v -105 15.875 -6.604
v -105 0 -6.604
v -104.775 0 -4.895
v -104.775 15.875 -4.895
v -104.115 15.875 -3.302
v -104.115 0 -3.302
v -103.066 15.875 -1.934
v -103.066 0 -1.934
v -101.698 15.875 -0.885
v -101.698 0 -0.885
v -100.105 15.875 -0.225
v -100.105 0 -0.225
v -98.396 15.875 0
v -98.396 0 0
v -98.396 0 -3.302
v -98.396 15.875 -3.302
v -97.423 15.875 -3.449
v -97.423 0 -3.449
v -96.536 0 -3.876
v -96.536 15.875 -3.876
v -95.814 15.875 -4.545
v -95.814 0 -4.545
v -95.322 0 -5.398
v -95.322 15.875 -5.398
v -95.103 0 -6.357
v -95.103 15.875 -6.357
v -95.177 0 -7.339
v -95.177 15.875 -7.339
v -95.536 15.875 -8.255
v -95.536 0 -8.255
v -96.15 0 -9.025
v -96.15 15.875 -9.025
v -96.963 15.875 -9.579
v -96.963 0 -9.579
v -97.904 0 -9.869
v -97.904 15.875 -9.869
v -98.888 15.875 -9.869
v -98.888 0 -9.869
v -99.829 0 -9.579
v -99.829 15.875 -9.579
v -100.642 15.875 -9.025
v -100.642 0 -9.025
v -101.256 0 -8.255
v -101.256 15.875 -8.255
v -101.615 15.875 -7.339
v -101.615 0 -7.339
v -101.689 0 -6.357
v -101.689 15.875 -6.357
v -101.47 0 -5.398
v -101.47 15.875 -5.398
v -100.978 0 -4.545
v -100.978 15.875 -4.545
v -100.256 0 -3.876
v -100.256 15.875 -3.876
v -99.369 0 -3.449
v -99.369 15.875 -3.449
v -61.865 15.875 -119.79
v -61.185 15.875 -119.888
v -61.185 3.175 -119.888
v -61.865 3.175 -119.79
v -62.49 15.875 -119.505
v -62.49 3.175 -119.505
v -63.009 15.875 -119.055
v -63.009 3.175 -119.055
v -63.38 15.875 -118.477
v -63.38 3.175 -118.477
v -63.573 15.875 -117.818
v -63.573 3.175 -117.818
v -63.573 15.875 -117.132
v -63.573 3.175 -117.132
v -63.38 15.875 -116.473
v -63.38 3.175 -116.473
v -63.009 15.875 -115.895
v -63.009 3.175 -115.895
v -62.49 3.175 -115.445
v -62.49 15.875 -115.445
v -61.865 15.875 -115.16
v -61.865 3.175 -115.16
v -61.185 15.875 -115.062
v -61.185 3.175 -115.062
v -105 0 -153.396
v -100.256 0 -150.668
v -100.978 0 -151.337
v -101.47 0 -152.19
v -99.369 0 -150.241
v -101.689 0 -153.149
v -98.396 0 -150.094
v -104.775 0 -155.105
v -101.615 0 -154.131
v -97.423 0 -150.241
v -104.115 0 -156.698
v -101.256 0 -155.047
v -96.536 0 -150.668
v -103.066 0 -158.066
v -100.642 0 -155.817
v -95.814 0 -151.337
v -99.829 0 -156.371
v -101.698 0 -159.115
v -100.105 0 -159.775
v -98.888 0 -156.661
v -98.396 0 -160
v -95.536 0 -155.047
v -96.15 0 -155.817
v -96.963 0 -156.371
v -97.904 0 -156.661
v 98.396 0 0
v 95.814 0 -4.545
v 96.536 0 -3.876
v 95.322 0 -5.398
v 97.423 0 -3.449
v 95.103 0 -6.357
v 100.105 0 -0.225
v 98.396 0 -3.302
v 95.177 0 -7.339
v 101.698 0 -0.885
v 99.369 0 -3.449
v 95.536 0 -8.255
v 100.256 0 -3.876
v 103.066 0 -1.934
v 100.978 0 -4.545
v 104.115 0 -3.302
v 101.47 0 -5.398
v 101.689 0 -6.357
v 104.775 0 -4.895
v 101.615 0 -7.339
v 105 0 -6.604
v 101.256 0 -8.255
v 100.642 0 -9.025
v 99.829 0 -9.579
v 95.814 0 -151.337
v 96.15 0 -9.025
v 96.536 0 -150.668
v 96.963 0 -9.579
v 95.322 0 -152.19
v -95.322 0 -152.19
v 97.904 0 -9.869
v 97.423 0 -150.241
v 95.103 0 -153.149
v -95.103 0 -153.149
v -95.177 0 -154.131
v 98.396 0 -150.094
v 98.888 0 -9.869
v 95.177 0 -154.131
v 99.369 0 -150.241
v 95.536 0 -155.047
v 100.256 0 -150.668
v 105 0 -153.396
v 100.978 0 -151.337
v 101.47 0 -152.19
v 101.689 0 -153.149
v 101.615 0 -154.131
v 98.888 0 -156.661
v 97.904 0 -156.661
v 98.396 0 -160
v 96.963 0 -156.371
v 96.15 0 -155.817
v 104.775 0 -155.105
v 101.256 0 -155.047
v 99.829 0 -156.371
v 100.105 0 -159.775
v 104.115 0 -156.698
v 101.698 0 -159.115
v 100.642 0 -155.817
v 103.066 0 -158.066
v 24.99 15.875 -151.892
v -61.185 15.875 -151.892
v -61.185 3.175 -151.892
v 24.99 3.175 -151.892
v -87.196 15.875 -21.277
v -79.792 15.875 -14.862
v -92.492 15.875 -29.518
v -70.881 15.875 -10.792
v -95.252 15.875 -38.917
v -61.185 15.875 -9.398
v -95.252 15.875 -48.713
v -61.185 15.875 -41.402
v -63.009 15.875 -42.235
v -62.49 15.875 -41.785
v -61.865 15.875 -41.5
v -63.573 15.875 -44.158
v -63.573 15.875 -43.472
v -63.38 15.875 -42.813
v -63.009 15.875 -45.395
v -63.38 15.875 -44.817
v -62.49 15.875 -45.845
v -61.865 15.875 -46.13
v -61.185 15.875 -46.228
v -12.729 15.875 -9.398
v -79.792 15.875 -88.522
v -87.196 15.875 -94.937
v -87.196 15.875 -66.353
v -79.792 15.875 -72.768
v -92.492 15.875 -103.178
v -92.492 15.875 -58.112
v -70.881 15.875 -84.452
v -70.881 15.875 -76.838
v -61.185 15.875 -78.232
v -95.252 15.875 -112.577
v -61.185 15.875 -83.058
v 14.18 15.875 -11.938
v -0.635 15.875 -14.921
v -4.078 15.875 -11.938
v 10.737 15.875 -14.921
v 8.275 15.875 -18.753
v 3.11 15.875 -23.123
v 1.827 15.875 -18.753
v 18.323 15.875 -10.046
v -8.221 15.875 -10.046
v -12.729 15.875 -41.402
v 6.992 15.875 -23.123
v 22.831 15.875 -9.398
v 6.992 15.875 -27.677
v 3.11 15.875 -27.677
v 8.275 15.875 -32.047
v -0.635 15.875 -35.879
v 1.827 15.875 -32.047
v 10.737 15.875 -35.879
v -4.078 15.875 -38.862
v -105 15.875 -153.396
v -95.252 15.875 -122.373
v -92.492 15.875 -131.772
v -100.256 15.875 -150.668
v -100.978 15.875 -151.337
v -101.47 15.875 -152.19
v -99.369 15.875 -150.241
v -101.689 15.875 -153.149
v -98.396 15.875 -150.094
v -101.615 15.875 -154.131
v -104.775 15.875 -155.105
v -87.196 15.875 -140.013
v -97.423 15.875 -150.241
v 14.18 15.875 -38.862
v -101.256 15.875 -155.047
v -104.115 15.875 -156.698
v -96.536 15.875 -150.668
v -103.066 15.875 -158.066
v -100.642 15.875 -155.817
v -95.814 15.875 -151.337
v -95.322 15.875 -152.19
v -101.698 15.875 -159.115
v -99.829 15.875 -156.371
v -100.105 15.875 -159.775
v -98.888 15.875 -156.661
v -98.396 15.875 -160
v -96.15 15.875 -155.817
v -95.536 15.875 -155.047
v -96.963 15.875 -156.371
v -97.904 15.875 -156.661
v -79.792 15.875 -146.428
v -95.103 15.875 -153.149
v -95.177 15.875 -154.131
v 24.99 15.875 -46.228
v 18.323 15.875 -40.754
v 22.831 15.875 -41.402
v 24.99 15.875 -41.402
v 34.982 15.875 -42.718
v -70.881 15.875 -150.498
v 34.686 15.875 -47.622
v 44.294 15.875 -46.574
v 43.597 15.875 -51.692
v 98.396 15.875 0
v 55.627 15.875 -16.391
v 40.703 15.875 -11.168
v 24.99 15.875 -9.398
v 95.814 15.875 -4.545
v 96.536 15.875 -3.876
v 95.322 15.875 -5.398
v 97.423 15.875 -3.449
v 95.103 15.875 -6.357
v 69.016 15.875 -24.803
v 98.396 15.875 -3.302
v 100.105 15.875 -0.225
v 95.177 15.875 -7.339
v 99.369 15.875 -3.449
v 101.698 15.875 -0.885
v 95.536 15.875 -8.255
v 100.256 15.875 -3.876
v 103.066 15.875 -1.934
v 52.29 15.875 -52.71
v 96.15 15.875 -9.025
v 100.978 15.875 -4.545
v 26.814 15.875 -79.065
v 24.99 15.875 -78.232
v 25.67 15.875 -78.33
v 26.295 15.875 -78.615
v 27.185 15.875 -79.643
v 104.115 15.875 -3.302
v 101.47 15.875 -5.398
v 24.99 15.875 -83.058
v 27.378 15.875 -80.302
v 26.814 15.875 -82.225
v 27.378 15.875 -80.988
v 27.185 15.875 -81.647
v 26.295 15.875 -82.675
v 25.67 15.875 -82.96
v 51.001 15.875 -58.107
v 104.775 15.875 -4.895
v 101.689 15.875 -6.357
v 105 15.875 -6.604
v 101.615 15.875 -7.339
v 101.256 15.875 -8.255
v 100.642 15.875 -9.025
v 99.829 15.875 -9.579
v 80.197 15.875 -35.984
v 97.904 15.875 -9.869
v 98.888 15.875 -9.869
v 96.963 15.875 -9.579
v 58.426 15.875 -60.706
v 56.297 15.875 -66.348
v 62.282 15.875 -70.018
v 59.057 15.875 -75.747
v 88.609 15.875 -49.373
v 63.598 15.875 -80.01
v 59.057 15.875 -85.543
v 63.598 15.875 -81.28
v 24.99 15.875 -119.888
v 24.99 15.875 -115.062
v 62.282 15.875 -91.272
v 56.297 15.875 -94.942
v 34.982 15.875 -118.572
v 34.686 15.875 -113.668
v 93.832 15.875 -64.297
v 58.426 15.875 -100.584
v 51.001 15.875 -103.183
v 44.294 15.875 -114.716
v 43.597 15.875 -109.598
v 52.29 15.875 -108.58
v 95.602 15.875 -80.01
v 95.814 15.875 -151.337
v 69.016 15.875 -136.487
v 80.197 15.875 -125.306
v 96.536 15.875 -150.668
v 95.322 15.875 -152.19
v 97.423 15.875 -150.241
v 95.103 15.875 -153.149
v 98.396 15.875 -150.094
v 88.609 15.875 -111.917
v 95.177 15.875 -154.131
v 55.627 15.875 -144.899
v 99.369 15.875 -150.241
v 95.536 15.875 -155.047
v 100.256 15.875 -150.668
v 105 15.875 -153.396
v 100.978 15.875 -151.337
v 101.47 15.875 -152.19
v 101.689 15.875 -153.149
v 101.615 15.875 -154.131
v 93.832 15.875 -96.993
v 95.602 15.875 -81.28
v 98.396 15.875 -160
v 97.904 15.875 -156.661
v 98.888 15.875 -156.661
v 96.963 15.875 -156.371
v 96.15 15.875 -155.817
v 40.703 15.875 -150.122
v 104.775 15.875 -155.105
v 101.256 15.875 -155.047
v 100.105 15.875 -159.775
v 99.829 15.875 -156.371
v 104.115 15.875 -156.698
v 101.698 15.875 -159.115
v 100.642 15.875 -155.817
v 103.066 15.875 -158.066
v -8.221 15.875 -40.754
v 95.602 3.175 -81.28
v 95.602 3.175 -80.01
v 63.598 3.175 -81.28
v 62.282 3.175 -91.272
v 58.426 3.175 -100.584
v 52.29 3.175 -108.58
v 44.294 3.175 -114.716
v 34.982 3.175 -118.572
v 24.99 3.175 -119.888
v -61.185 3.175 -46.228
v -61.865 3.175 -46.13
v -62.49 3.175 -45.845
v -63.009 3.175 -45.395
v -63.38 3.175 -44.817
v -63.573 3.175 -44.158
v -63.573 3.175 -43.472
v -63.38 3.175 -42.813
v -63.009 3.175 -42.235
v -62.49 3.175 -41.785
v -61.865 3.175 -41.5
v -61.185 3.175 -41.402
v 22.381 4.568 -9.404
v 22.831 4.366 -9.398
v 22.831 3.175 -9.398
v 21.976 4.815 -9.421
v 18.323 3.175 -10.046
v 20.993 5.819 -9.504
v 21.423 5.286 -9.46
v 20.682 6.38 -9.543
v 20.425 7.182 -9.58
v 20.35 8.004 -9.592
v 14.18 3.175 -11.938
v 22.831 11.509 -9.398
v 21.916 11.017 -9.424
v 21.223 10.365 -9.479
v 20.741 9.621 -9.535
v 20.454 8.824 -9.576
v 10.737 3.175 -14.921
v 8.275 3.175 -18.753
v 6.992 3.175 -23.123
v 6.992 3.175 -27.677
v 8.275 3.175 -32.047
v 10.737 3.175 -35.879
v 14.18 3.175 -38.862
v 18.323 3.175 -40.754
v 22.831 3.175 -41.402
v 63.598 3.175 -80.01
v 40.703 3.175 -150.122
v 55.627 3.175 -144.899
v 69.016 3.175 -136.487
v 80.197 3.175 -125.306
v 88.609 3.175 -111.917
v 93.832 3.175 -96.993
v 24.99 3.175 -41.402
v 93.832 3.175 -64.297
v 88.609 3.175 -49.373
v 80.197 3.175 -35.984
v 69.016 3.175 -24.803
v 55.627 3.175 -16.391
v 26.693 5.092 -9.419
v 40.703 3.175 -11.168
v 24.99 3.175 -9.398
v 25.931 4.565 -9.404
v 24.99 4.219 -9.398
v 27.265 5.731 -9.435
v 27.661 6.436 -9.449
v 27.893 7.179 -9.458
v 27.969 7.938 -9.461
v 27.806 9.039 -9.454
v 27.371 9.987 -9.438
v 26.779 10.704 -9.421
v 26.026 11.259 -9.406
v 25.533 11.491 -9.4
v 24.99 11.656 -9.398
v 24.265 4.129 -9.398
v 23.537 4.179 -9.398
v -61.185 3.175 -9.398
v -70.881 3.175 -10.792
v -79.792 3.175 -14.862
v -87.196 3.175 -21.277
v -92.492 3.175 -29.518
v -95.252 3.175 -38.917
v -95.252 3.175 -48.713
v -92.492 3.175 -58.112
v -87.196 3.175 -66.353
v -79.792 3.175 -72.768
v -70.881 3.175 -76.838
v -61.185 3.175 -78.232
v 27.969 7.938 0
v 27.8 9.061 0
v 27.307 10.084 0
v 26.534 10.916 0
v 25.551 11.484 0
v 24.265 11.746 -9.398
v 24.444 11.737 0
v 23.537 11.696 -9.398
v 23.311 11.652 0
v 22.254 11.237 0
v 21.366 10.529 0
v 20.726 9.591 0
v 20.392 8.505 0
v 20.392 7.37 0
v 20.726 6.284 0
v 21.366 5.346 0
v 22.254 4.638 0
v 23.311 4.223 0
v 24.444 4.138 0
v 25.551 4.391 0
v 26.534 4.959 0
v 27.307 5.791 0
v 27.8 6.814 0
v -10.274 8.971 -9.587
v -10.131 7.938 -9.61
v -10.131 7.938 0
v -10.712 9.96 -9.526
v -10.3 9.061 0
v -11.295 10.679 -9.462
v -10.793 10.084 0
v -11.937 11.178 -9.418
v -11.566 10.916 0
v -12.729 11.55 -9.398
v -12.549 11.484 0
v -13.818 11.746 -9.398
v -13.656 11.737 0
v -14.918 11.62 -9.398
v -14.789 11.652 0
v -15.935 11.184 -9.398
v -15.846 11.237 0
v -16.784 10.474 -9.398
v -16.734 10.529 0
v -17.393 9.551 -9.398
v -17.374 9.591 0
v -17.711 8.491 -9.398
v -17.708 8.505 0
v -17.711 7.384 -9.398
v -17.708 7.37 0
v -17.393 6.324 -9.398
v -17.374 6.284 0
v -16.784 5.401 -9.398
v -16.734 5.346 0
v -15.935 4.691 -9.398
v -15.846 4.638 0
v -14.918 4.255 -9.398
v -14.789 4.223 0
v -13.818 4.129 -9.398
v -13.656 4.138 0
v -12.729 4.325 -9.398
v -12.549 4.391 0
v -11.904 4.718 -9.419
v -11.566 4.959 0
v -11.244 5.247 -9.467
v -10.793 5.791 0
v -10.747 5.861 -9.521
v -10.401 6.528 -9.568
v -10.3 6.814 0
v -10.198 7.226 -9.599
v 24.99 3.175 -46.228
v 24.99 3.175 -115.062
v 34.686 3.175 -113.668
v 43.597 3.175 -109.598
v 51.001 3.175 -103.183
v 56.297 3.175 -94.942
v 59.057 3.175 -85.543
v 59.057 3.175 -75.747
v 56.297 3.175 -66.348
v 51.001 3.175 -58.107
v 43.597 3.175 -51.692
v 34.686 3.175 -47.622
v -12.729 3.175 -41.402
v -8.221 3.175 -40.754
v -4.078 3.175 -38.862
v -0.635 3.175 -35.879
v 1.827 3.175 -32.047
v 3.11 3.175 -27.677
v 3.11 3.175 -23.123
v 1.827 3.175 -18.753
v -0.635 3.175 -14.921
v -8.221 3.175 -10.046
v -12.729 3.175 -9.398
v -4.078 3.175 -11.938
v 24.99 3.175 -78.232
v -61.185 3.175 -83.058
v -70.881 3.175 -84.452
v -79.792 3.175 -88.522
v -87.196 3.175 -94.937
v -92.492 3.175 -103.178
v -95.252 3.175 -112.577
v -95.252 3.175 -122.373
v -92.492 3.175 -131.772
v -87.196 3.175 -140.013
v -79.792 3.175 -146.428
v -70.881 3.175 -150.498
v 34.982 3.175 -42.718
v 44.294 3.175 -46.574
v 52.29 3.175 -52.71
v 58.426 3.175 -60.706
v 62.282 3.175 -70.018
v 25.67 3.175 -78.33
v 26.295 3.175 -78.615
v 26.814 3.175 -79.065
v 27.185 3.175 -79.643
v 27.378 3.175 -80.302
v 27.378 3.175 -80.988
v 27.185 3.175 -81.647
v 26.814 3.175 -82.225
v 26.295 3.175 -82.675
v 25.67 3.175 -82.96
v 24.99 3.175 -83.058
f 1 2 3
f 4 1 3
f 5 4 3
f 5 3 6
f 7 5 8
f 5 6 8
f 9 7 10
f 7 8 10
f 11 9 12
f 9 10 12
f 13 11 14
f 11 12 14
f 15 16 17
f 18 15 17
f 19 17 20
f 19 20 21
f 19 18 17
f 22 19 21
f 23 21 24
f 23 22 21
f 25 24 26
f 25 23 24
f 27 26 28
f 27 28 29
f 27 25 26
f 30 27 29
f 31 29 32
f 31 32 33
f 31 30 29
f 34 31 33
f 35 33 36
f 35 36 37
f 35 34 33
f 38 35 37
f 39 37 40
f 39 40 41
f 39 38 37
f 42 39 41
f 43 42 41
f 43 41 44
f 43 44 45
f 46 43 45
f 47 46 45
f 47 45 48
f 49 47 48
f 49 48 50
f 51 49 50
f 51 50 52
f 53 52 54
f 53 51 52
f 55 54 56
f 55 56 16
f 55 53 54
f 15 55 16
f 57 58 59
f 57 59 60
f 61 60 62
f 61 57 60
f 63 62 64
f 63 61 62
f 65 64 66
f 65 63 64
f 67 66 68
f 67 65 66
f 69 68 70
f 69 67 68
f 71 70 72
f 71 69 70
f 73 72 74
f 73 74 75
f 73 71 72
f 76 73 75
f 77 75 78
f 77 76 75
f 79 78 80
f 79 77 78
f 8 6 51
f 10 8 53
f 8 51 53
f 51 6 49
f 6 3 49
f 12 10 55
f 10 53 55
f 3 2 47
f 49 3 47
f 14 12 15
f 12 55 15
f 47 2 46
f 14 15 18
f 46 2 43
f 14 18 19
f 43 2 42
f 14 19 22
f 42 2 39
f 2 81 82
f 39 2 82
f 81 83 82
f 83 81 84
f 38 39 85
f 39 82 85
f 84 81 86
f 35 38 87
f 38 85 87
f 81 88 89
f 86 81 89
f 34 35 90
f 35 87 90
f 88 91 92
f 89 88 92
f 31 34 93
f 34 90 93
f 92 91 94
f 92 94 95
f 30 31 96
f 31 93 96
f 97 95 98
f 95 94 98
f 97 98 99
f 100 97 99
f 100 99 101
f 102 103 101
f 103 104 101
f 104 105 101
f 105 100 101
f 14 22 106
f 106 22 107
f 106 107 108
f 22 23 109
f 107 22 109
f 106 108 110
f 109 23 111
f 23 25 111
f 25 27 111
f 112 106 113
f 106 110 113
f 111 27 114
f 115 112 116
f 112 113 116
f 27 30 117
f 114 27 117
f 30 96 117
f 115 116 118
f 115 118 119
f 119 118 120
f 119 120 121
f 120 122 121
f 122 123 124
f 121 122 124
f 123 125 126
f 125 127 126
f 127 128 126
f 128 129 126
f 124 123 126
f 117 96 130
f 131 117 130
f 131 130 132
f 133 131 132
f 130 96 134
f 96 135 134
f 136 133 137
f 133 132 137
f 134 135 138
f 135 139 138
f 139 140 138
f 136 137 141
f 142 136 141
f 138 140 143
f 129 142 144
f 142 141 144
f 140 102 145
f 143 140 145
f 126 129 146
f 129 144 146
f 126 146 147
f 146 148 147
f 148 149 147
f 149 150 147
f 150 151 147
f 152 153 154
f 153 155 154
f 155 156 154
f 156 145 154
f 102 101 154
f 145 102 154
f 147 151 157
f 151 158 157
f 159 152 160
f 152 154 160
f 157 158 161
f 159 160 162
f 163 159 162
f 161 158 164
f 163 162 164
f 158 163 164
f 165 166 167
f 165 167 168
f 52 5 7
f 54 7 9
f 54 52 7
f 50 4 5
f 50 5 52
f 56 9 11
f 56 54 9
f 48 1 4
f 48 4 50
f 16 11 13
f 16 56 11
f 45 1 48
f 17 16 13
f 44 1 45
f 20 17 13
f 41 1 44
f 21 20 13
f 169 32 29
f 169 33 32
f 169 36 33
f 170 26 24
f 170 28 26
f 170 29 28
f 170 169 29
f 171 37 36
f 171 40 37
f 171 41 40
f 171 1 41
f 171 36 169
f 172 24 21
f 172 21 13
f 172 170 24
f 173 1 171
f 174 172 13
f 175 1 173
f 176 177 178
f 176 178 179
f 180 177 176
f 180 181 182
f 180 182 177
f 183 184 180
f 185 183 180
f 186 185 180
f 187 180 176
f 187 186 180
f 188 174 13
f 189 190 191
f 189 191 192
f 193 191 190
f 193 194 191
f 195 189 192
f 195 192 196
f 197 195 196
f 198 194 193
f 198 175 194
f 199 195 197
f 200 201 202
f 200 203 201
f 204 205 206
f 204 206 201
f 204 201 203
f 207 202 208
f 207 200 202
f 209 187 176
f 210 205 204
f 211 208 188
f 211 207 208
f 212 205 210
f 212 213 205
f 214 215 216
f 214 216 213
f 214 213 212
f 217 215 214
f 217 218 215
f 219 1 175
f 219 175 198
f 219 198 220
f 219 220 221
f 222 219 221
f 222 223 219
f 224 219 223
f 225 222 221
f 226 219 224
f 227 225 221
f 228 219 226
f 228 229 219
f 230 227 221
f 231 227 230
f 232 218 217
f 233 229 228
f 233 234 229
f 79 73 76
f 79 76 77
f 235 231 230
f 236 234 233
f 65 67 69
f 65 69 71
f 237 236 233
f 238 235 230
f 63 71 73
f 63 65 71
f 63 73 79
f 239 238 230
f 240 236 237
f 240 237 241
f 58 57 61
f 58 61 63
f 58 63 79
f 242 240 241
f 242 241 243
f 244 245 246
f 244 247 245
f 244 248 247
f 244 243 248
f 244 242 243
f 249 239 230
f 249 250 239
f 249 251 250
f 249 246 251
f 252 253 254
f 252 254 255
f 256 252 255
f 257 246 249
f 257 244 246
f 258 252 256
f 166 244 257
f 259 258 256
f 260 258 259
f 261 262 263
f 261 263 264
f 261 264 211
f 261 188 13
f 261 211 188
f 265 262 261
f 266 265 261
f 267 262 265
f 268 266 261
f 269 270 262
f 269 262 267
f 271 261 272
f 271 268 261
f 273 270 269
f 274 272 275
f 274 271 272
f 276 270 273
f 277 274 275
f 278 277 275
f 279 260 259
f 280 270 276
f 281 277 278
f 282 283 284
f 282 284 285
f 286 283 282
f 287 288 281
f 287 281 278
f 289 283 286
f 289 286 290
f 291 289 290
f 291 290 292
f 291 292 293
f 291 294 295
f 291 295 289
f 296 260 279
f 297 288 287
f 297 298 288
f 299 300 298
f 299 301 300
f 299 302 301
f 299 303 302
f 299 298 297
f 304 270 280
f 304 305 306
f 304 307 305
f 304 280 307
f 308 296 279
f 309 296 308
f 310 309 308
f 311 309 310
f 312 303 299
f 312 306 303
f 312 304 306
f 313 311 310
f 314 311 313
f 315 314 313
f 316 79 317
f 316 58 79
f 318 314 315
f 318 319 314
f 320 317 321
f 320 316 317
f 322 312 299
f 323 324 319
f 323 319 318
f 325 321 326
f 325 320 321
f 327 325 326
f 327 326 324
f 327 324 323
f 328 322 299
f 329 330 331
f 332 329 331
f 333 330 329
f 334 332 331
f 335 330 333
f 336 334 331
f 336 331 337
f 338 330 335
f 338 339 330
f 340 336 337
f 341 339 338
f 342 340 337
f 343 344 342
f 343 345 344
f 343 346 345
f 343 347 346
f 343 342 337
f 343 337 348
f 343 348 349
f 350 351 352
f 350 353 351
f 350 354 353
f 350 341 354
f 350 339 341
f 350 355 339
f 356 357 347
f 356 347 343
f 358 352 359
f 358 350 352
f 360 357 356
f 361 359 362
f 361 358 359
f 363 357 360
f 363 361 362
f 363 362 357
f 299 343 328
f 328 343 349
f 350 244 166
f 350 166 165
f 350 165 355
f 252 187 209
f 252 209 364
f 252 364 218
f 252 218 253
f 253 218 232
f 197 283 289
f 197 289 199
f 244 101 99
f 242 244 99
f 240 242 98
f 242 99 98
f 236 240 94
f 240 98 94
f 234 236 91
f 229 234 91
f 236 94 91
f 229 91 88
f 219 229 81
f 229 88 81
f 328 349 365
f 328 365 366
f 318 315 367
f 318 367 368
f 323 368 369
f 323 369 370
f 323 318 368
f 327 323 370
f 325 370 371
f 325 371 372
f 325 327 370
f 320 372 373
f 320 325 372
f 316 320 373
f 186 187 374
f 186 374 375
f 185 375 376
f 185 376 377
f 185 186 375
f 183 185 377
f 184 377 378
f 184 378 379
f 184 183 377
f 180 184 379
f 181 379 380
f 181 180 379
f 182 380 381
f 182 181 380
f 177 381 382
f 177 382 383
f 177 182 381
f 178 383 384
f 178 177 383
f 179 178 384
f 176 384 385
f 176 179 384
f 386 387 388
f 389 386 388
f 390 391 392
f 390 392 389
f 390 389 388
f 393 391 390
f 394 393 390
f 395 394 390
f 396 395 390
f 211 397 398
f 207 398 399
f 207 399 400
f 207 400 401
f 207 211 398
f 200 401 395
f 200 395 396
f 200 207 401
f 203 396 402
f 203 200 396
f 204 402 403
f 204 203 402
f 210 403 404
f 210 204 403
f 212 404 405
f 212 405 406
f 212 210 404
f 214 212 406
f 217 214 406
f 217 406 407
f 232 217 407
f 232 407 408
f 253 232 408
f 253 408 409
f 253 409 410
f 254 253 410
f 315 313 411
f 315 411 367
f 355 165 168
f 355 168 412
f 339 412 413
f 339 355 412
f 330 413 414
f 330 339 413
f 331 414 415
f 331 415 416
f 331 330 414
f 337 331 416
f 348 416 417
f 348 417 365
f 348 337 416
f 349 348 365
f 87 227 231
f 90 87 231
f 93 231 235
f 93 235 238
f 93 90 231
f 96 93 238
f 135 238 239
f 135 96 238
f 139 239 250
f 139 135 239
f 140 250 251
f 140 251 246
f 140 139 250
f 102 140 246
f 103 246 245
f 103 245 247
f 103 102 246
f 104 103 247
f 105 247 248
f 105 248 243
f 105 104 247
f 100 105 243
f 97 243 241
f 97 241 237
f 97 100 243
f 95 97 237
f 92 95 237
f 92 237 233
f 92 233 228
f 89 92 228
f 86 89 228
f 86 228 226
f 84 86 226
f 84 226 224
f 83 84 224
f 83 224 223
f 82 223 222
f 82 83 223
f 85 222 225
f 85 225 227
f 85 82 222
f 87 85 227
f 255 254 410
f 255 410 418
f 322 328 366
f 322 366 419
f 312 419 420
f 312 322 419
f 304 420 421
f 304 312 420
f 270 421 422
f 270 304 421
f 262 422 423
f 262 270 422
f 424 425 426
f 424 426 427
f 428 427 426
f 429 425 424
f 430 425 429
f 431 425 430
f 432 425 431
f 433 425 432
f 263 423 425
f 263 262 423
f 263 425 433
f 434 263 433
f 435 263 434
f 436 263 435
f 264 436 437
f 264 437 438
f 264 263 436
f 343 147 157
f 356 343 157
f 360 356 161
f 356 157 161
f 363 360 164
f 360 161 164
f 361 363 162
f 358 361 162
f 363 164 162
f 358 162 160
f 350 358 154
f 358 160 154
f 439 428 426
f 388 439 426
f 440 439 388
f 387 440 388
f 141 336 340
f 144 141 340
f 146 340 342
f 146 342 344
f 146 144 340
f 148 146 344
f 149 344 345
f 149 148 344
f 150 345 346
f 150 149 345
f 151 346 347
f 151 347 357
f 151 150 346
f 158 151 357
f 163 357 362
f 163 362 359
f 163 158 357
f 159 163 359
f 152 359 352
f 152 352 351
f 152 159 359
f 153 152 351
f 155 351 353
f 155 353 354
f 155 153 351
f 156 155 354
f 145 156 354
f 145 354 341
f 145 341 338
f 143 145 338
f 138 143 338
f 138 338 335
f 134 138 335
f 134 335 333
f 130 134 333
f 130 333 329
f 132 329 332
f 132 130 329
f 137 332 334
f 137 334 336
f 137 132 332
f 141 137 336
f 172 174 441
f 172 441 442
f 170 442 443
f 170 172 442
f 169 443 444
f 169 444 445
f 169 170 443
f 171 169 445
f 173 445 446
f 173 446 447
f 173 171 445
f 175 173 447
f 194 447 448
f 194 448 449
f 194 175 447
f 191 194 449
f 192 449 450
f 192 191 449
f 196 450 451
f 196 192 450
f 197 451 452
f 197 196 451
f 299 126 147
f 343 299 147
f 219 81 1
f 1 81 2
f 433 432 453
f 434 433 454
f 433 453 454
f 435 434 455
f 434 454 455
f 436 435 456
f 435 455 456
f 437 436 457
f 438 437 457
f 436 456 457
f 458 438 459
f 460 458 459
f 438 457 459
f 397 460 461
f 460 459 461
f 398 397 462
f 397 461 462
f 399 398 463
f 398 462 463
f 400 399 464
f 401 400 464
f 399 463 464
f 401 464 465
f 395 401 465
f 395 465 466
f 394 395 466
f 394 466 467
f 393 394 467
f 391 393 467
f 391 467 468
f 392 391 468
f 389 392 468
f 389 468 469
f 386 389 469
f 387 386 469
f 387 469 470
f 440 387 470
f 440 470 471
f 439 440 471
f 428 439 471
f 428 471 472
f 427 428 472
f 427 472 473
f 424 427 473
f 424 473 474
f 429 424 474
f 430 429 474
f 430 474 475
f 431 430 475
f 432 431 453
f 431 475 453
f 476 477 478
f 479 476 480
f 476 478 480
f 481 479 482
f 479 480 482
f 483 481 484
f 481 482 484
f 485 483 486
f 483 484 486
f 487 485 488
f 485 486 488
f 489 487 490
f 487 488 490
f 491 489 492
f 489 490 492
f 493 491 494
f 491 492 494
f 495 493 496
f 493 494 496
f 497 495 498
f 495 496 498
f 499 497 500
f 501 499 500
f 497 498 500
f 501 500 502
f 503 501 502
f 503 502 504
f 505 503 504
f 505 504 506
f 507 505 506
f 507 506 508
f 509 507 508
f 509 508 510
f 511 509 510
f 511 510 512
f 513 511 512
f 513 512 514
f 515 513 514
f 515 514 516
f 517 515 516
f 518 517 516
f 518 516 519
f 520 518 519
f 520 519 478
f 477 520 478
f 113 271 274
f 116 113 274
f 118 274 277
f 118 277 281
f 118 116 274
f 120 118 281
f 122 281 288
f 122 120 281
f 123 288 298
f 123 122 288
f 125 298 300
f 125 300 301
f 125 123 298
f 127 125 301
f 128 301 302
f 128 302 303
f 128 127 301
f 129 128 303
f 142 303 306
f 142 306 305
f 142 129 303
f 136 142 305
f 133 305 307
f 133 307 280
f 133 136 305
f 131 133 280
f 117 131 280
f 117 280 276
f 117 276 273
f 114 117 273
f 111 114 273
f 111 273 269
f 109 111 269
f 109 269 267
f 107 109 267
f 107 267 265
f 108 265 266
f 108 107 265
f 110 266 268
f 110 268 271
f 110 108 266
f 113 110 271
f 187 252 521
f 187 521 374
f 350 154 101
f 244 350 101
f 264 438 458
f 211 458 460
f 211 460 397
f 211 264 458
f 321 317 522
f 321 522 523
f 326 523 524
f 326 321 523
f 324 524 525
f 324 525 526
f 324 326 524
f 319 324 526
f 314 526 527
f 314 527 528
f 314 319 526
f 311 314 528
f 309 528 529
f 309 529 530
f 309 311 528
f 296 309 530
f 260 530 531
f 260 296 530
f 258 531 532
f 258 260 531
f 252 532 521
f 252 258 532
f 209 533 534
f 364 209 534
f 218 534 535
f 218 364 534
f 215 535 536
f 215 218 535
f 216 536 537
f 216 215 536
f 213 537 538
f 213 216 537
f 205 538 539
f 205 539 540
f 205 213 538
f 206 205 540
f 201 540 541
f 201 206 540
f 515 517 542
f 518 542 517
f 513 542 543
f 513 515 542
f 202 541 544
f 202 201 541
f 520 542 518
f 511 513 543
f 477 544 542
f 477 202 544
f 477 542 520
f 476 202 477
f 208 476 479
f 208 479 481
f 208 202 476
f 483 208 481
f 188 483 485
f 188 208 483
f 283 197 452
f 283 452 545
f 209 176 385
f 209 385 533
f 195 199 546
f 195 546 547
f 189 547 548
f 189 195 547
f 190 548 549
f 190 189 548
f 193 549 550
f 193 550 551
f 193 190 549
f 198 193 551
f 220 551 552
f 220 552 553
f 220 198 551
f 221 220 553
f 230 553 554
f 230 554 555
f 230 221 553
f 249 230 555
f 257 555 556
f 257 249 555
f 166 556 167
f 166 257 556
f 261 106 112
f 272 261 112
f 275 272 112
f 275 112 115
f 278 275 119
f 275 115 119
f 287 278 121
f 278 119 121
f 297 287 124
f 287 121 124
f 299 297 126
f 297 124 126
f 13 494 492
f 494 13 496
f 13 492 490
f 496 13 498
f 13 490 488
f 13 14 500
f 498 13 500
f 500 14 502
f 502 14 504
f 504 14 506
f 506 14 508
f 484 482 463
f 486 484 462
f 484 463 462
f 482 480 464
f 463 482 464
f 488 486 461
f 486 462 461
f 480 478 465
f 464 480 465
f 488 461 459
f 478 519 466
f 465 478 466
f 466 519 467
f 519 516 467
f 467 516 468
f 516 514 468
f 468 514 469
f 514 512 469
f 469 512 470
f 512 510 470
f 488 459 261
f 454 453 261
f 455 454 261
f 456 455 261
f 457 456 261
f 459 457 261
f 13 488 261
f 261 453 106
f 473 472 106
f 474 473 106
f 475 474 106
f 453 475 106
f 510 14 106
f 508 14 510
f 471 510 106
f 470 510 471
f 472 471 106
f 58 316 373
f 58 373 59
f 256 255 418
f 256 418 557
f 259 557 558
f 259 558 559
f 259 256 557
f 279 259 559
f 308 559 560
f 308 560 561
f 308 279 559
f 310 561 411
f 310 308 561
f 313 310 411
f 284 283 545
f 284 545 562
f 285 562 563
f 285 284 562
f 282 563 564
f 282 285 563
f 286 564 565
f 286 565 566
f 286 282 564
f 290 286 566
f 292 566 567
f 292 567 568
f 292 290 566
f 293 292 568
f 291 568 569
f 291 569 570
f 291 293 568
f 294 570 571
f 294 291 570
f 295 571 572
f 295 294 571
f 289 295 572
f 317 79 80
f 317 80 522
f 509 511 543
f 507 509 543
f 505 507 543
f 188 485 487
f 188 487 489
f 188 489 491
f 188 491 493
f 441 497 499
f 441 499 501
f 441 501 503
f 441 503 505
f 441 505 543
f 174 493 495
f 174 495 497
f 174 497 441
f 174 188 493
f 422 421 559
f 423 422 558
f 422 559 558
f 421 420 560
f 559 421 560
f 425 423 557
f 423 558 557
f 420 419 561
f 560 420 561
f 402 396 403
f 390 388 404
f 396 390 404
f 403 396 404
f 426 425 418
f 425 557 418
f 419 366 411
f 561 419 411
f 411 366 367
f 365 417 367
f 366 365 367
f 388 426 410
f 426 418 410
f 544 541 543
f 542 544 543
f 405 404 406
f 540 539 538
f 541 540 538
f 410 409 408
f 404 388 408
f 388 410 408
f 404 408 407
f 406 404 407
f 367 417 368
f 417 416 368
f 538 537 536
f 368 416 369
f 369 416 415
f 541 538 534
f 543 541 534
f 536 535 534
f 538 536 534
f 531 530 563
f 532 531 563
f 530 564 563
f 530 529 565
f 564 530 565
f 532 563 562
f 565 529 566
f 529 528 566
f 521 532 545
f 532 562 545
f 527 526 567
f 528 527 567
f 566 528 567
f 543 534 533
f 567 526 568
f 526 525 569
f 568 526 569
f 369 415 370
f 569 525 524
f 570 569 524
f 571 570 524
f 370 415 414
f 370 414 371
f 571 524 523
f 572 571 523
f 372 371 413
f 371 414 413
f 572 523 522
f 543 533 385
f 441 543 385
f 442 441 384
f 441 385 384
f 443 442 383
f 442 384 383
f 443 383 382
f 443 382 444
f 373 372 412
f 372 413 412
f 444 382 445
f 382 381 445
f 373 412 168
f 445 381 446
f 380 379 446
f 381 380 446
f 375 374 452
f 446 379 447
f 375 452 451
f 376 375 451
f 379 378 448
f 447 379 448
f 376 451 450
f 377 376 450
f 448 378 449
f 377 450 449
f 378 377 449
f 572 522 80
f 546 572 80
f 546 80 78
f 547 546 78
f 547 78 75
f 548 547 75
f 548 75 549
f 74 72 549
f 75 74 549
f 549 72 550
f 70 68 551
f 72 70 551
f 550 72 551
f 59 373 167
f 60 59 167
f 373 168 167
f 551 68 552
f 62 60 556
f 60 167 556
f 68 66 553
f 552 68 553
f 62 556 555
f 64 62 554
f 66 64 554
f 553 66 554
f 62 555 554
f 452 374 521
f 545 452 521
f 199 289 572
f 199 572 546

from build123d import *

# Parameters (mm, degrees)
SKETCH1_R           = 3.302
BOSS_EXTRUDE1_DEPTH = 15.875
CUT_EXTRUDE1_DEPTH  = 12.7
SKETCH4_R           = 3.81
CUT_EXTRUDE2_DEPTH  = 13.97


with BuildPart() as part:
    # Sketch1 → Boss-Extrude1 (new body)
    with BuildSketch(Plane(origin=(0, 0, 0), x_dir=(1, 0, 0), z_dir=(0, 1, 0))):
        with BuildLine():
            Line((-98.396, 0), (98.396, 0))
            ThreePointArc((98.396, 0), (103.065733183, 1.934266817), (105, 6.604))
            Line((105, 6.604), (105, 153.396))
            ThreePointArc((105, 153.396), (103.065733183, 158.065733183), (98.396, 160))
            Line((98.396, 160), (-98.396, 160))
            ThreePointArc((-98.396, 160), (-103.065733183, 158.065733183), (-105, 153.396))
            Line((-105, 153.396), (-105, 6.604))
            ThreePointArc((-105, 6.604), (-103.065733183, 1.934266817), (-98.396, 0))
        make_face()
        with Locations(Location((-98.396, 6.604, 0), (0, 0, 270))):  # turned: the seam where the file's is
            Circle(SKETCH1_R, mode=Mode.SUBTRACT)
        with Locations(Location((98.396, 6.604, 0), (0, 0, 270))):  # turned: the seam where the file's is
            Circle(SKETCH1_R, mode=Mode.SUBTRACT)
        with Locations(Location((98.396, 153.396, 0), (0, 0, 270))):  # turned: the seam where the file's is
            Circle(SKETCH1_R, mode=Mode.SUBTRACT)
        with Locations(Location((-98.396, 153.396, 0), (0, 0, 270))):  # turned: the seam where the file's is
            Circle(SKETCH1_R, mode=Mode.SUBTRACT)
    extrude(amount=BOSS_EXTRUDE1_DEPTH)

    # Sketch3 → Cut-Extrude1 (cut)
    with BuildSketch(Plane(origin=(0, 15.875, 0), x_dir=(1, 0, 0), z_dir=(0, 1, 0))):
        with BuildLine():
            Line((63.598, 80.01), (63.598, 81.28))
            ThreePointArc((63.598, 81.28), (52.289978608, 108.579978608), (24.99, 119.888))
            Line((24.99, 119.888), (-61.185, 119.888))
            ThreePointArc((-61.185, 119.888), (-63.598, 117.475), (-61.185, 115.062))
            Line((-61.185, 115.062), (24.99, 115.062))
            ThreePointArc((24.99, 115.062), (59.407, 80.645), (24.99, 46.228))
            Line((24.99, 46.228), (-61.185, 46.228))
            ThreePointArc((-61.185, 46.228), (-63.598, 43.815), (-61.185, 41.402))
            Line((-61.185, 41.402), (-12.729, 41.402))
            ThreePointArc((-12.729, 41.402), (3.273, 25.4), (-12.729, 9.398))
            Line((-12.729, 9.398), (-61.185, 9.398))
            ThreePointArc((-61.185, 9.398), (-95.602, 43.815), (-61.185, 78.232))
            Line((-61.185, 78.232), (24.99, 78.232))
            ThreePointArc((24.99, 78.232), (27.403, 80.645), (24.99, 83.058))
            Line((24.99, 83.058), (-61.185, 83.058))
            ThreePointArc((-61.185, 83.058), (-95.602, 117.475), (-61.185, 151.892))
            Line((-61.185, 151.892), (24.99, 151.892))
            ThreePointArc((24.99, 151.892), (74.920224033, 131.210224033), (95.602, 81.28))
            Line((95.602, 81.28), (95.602, 80.01))
            ThreePointArc((95.602, 80.01), (74.920224033, 30.079775967), (24.99, 9.398))
            Line((24.99, 9.398), (22.831, 9.398))
            ThreePointArc((22.831, 9.398), (6.829, 25.4), (22.831, 41.402))
            Line((22.831, 41.402), (24.99, 41.402))
            ThreePointArc((24.99, 41.402), (52.289978608, 52.710021392), (63.598, 80.01))
        make_face()
    extrude(amount=-CUT_EXTRUDE1_DEPTH, mode=Mode.SUBTRACT)

    # Sketch4 → Cut-Extrude2 (cut)
    with BuildSketch(Plane.XY):
        with Locations((-13.941, 7.9375)):
            Circle(SKETCH4_R)
        with Locations((24.159, 7.9375)):
            Circle(SKETCH4_R)
    extrude(amount=-CUT_EXTRUDE2_DEPTH, mode=Mode.SUBTRACT)


solid = part.part
